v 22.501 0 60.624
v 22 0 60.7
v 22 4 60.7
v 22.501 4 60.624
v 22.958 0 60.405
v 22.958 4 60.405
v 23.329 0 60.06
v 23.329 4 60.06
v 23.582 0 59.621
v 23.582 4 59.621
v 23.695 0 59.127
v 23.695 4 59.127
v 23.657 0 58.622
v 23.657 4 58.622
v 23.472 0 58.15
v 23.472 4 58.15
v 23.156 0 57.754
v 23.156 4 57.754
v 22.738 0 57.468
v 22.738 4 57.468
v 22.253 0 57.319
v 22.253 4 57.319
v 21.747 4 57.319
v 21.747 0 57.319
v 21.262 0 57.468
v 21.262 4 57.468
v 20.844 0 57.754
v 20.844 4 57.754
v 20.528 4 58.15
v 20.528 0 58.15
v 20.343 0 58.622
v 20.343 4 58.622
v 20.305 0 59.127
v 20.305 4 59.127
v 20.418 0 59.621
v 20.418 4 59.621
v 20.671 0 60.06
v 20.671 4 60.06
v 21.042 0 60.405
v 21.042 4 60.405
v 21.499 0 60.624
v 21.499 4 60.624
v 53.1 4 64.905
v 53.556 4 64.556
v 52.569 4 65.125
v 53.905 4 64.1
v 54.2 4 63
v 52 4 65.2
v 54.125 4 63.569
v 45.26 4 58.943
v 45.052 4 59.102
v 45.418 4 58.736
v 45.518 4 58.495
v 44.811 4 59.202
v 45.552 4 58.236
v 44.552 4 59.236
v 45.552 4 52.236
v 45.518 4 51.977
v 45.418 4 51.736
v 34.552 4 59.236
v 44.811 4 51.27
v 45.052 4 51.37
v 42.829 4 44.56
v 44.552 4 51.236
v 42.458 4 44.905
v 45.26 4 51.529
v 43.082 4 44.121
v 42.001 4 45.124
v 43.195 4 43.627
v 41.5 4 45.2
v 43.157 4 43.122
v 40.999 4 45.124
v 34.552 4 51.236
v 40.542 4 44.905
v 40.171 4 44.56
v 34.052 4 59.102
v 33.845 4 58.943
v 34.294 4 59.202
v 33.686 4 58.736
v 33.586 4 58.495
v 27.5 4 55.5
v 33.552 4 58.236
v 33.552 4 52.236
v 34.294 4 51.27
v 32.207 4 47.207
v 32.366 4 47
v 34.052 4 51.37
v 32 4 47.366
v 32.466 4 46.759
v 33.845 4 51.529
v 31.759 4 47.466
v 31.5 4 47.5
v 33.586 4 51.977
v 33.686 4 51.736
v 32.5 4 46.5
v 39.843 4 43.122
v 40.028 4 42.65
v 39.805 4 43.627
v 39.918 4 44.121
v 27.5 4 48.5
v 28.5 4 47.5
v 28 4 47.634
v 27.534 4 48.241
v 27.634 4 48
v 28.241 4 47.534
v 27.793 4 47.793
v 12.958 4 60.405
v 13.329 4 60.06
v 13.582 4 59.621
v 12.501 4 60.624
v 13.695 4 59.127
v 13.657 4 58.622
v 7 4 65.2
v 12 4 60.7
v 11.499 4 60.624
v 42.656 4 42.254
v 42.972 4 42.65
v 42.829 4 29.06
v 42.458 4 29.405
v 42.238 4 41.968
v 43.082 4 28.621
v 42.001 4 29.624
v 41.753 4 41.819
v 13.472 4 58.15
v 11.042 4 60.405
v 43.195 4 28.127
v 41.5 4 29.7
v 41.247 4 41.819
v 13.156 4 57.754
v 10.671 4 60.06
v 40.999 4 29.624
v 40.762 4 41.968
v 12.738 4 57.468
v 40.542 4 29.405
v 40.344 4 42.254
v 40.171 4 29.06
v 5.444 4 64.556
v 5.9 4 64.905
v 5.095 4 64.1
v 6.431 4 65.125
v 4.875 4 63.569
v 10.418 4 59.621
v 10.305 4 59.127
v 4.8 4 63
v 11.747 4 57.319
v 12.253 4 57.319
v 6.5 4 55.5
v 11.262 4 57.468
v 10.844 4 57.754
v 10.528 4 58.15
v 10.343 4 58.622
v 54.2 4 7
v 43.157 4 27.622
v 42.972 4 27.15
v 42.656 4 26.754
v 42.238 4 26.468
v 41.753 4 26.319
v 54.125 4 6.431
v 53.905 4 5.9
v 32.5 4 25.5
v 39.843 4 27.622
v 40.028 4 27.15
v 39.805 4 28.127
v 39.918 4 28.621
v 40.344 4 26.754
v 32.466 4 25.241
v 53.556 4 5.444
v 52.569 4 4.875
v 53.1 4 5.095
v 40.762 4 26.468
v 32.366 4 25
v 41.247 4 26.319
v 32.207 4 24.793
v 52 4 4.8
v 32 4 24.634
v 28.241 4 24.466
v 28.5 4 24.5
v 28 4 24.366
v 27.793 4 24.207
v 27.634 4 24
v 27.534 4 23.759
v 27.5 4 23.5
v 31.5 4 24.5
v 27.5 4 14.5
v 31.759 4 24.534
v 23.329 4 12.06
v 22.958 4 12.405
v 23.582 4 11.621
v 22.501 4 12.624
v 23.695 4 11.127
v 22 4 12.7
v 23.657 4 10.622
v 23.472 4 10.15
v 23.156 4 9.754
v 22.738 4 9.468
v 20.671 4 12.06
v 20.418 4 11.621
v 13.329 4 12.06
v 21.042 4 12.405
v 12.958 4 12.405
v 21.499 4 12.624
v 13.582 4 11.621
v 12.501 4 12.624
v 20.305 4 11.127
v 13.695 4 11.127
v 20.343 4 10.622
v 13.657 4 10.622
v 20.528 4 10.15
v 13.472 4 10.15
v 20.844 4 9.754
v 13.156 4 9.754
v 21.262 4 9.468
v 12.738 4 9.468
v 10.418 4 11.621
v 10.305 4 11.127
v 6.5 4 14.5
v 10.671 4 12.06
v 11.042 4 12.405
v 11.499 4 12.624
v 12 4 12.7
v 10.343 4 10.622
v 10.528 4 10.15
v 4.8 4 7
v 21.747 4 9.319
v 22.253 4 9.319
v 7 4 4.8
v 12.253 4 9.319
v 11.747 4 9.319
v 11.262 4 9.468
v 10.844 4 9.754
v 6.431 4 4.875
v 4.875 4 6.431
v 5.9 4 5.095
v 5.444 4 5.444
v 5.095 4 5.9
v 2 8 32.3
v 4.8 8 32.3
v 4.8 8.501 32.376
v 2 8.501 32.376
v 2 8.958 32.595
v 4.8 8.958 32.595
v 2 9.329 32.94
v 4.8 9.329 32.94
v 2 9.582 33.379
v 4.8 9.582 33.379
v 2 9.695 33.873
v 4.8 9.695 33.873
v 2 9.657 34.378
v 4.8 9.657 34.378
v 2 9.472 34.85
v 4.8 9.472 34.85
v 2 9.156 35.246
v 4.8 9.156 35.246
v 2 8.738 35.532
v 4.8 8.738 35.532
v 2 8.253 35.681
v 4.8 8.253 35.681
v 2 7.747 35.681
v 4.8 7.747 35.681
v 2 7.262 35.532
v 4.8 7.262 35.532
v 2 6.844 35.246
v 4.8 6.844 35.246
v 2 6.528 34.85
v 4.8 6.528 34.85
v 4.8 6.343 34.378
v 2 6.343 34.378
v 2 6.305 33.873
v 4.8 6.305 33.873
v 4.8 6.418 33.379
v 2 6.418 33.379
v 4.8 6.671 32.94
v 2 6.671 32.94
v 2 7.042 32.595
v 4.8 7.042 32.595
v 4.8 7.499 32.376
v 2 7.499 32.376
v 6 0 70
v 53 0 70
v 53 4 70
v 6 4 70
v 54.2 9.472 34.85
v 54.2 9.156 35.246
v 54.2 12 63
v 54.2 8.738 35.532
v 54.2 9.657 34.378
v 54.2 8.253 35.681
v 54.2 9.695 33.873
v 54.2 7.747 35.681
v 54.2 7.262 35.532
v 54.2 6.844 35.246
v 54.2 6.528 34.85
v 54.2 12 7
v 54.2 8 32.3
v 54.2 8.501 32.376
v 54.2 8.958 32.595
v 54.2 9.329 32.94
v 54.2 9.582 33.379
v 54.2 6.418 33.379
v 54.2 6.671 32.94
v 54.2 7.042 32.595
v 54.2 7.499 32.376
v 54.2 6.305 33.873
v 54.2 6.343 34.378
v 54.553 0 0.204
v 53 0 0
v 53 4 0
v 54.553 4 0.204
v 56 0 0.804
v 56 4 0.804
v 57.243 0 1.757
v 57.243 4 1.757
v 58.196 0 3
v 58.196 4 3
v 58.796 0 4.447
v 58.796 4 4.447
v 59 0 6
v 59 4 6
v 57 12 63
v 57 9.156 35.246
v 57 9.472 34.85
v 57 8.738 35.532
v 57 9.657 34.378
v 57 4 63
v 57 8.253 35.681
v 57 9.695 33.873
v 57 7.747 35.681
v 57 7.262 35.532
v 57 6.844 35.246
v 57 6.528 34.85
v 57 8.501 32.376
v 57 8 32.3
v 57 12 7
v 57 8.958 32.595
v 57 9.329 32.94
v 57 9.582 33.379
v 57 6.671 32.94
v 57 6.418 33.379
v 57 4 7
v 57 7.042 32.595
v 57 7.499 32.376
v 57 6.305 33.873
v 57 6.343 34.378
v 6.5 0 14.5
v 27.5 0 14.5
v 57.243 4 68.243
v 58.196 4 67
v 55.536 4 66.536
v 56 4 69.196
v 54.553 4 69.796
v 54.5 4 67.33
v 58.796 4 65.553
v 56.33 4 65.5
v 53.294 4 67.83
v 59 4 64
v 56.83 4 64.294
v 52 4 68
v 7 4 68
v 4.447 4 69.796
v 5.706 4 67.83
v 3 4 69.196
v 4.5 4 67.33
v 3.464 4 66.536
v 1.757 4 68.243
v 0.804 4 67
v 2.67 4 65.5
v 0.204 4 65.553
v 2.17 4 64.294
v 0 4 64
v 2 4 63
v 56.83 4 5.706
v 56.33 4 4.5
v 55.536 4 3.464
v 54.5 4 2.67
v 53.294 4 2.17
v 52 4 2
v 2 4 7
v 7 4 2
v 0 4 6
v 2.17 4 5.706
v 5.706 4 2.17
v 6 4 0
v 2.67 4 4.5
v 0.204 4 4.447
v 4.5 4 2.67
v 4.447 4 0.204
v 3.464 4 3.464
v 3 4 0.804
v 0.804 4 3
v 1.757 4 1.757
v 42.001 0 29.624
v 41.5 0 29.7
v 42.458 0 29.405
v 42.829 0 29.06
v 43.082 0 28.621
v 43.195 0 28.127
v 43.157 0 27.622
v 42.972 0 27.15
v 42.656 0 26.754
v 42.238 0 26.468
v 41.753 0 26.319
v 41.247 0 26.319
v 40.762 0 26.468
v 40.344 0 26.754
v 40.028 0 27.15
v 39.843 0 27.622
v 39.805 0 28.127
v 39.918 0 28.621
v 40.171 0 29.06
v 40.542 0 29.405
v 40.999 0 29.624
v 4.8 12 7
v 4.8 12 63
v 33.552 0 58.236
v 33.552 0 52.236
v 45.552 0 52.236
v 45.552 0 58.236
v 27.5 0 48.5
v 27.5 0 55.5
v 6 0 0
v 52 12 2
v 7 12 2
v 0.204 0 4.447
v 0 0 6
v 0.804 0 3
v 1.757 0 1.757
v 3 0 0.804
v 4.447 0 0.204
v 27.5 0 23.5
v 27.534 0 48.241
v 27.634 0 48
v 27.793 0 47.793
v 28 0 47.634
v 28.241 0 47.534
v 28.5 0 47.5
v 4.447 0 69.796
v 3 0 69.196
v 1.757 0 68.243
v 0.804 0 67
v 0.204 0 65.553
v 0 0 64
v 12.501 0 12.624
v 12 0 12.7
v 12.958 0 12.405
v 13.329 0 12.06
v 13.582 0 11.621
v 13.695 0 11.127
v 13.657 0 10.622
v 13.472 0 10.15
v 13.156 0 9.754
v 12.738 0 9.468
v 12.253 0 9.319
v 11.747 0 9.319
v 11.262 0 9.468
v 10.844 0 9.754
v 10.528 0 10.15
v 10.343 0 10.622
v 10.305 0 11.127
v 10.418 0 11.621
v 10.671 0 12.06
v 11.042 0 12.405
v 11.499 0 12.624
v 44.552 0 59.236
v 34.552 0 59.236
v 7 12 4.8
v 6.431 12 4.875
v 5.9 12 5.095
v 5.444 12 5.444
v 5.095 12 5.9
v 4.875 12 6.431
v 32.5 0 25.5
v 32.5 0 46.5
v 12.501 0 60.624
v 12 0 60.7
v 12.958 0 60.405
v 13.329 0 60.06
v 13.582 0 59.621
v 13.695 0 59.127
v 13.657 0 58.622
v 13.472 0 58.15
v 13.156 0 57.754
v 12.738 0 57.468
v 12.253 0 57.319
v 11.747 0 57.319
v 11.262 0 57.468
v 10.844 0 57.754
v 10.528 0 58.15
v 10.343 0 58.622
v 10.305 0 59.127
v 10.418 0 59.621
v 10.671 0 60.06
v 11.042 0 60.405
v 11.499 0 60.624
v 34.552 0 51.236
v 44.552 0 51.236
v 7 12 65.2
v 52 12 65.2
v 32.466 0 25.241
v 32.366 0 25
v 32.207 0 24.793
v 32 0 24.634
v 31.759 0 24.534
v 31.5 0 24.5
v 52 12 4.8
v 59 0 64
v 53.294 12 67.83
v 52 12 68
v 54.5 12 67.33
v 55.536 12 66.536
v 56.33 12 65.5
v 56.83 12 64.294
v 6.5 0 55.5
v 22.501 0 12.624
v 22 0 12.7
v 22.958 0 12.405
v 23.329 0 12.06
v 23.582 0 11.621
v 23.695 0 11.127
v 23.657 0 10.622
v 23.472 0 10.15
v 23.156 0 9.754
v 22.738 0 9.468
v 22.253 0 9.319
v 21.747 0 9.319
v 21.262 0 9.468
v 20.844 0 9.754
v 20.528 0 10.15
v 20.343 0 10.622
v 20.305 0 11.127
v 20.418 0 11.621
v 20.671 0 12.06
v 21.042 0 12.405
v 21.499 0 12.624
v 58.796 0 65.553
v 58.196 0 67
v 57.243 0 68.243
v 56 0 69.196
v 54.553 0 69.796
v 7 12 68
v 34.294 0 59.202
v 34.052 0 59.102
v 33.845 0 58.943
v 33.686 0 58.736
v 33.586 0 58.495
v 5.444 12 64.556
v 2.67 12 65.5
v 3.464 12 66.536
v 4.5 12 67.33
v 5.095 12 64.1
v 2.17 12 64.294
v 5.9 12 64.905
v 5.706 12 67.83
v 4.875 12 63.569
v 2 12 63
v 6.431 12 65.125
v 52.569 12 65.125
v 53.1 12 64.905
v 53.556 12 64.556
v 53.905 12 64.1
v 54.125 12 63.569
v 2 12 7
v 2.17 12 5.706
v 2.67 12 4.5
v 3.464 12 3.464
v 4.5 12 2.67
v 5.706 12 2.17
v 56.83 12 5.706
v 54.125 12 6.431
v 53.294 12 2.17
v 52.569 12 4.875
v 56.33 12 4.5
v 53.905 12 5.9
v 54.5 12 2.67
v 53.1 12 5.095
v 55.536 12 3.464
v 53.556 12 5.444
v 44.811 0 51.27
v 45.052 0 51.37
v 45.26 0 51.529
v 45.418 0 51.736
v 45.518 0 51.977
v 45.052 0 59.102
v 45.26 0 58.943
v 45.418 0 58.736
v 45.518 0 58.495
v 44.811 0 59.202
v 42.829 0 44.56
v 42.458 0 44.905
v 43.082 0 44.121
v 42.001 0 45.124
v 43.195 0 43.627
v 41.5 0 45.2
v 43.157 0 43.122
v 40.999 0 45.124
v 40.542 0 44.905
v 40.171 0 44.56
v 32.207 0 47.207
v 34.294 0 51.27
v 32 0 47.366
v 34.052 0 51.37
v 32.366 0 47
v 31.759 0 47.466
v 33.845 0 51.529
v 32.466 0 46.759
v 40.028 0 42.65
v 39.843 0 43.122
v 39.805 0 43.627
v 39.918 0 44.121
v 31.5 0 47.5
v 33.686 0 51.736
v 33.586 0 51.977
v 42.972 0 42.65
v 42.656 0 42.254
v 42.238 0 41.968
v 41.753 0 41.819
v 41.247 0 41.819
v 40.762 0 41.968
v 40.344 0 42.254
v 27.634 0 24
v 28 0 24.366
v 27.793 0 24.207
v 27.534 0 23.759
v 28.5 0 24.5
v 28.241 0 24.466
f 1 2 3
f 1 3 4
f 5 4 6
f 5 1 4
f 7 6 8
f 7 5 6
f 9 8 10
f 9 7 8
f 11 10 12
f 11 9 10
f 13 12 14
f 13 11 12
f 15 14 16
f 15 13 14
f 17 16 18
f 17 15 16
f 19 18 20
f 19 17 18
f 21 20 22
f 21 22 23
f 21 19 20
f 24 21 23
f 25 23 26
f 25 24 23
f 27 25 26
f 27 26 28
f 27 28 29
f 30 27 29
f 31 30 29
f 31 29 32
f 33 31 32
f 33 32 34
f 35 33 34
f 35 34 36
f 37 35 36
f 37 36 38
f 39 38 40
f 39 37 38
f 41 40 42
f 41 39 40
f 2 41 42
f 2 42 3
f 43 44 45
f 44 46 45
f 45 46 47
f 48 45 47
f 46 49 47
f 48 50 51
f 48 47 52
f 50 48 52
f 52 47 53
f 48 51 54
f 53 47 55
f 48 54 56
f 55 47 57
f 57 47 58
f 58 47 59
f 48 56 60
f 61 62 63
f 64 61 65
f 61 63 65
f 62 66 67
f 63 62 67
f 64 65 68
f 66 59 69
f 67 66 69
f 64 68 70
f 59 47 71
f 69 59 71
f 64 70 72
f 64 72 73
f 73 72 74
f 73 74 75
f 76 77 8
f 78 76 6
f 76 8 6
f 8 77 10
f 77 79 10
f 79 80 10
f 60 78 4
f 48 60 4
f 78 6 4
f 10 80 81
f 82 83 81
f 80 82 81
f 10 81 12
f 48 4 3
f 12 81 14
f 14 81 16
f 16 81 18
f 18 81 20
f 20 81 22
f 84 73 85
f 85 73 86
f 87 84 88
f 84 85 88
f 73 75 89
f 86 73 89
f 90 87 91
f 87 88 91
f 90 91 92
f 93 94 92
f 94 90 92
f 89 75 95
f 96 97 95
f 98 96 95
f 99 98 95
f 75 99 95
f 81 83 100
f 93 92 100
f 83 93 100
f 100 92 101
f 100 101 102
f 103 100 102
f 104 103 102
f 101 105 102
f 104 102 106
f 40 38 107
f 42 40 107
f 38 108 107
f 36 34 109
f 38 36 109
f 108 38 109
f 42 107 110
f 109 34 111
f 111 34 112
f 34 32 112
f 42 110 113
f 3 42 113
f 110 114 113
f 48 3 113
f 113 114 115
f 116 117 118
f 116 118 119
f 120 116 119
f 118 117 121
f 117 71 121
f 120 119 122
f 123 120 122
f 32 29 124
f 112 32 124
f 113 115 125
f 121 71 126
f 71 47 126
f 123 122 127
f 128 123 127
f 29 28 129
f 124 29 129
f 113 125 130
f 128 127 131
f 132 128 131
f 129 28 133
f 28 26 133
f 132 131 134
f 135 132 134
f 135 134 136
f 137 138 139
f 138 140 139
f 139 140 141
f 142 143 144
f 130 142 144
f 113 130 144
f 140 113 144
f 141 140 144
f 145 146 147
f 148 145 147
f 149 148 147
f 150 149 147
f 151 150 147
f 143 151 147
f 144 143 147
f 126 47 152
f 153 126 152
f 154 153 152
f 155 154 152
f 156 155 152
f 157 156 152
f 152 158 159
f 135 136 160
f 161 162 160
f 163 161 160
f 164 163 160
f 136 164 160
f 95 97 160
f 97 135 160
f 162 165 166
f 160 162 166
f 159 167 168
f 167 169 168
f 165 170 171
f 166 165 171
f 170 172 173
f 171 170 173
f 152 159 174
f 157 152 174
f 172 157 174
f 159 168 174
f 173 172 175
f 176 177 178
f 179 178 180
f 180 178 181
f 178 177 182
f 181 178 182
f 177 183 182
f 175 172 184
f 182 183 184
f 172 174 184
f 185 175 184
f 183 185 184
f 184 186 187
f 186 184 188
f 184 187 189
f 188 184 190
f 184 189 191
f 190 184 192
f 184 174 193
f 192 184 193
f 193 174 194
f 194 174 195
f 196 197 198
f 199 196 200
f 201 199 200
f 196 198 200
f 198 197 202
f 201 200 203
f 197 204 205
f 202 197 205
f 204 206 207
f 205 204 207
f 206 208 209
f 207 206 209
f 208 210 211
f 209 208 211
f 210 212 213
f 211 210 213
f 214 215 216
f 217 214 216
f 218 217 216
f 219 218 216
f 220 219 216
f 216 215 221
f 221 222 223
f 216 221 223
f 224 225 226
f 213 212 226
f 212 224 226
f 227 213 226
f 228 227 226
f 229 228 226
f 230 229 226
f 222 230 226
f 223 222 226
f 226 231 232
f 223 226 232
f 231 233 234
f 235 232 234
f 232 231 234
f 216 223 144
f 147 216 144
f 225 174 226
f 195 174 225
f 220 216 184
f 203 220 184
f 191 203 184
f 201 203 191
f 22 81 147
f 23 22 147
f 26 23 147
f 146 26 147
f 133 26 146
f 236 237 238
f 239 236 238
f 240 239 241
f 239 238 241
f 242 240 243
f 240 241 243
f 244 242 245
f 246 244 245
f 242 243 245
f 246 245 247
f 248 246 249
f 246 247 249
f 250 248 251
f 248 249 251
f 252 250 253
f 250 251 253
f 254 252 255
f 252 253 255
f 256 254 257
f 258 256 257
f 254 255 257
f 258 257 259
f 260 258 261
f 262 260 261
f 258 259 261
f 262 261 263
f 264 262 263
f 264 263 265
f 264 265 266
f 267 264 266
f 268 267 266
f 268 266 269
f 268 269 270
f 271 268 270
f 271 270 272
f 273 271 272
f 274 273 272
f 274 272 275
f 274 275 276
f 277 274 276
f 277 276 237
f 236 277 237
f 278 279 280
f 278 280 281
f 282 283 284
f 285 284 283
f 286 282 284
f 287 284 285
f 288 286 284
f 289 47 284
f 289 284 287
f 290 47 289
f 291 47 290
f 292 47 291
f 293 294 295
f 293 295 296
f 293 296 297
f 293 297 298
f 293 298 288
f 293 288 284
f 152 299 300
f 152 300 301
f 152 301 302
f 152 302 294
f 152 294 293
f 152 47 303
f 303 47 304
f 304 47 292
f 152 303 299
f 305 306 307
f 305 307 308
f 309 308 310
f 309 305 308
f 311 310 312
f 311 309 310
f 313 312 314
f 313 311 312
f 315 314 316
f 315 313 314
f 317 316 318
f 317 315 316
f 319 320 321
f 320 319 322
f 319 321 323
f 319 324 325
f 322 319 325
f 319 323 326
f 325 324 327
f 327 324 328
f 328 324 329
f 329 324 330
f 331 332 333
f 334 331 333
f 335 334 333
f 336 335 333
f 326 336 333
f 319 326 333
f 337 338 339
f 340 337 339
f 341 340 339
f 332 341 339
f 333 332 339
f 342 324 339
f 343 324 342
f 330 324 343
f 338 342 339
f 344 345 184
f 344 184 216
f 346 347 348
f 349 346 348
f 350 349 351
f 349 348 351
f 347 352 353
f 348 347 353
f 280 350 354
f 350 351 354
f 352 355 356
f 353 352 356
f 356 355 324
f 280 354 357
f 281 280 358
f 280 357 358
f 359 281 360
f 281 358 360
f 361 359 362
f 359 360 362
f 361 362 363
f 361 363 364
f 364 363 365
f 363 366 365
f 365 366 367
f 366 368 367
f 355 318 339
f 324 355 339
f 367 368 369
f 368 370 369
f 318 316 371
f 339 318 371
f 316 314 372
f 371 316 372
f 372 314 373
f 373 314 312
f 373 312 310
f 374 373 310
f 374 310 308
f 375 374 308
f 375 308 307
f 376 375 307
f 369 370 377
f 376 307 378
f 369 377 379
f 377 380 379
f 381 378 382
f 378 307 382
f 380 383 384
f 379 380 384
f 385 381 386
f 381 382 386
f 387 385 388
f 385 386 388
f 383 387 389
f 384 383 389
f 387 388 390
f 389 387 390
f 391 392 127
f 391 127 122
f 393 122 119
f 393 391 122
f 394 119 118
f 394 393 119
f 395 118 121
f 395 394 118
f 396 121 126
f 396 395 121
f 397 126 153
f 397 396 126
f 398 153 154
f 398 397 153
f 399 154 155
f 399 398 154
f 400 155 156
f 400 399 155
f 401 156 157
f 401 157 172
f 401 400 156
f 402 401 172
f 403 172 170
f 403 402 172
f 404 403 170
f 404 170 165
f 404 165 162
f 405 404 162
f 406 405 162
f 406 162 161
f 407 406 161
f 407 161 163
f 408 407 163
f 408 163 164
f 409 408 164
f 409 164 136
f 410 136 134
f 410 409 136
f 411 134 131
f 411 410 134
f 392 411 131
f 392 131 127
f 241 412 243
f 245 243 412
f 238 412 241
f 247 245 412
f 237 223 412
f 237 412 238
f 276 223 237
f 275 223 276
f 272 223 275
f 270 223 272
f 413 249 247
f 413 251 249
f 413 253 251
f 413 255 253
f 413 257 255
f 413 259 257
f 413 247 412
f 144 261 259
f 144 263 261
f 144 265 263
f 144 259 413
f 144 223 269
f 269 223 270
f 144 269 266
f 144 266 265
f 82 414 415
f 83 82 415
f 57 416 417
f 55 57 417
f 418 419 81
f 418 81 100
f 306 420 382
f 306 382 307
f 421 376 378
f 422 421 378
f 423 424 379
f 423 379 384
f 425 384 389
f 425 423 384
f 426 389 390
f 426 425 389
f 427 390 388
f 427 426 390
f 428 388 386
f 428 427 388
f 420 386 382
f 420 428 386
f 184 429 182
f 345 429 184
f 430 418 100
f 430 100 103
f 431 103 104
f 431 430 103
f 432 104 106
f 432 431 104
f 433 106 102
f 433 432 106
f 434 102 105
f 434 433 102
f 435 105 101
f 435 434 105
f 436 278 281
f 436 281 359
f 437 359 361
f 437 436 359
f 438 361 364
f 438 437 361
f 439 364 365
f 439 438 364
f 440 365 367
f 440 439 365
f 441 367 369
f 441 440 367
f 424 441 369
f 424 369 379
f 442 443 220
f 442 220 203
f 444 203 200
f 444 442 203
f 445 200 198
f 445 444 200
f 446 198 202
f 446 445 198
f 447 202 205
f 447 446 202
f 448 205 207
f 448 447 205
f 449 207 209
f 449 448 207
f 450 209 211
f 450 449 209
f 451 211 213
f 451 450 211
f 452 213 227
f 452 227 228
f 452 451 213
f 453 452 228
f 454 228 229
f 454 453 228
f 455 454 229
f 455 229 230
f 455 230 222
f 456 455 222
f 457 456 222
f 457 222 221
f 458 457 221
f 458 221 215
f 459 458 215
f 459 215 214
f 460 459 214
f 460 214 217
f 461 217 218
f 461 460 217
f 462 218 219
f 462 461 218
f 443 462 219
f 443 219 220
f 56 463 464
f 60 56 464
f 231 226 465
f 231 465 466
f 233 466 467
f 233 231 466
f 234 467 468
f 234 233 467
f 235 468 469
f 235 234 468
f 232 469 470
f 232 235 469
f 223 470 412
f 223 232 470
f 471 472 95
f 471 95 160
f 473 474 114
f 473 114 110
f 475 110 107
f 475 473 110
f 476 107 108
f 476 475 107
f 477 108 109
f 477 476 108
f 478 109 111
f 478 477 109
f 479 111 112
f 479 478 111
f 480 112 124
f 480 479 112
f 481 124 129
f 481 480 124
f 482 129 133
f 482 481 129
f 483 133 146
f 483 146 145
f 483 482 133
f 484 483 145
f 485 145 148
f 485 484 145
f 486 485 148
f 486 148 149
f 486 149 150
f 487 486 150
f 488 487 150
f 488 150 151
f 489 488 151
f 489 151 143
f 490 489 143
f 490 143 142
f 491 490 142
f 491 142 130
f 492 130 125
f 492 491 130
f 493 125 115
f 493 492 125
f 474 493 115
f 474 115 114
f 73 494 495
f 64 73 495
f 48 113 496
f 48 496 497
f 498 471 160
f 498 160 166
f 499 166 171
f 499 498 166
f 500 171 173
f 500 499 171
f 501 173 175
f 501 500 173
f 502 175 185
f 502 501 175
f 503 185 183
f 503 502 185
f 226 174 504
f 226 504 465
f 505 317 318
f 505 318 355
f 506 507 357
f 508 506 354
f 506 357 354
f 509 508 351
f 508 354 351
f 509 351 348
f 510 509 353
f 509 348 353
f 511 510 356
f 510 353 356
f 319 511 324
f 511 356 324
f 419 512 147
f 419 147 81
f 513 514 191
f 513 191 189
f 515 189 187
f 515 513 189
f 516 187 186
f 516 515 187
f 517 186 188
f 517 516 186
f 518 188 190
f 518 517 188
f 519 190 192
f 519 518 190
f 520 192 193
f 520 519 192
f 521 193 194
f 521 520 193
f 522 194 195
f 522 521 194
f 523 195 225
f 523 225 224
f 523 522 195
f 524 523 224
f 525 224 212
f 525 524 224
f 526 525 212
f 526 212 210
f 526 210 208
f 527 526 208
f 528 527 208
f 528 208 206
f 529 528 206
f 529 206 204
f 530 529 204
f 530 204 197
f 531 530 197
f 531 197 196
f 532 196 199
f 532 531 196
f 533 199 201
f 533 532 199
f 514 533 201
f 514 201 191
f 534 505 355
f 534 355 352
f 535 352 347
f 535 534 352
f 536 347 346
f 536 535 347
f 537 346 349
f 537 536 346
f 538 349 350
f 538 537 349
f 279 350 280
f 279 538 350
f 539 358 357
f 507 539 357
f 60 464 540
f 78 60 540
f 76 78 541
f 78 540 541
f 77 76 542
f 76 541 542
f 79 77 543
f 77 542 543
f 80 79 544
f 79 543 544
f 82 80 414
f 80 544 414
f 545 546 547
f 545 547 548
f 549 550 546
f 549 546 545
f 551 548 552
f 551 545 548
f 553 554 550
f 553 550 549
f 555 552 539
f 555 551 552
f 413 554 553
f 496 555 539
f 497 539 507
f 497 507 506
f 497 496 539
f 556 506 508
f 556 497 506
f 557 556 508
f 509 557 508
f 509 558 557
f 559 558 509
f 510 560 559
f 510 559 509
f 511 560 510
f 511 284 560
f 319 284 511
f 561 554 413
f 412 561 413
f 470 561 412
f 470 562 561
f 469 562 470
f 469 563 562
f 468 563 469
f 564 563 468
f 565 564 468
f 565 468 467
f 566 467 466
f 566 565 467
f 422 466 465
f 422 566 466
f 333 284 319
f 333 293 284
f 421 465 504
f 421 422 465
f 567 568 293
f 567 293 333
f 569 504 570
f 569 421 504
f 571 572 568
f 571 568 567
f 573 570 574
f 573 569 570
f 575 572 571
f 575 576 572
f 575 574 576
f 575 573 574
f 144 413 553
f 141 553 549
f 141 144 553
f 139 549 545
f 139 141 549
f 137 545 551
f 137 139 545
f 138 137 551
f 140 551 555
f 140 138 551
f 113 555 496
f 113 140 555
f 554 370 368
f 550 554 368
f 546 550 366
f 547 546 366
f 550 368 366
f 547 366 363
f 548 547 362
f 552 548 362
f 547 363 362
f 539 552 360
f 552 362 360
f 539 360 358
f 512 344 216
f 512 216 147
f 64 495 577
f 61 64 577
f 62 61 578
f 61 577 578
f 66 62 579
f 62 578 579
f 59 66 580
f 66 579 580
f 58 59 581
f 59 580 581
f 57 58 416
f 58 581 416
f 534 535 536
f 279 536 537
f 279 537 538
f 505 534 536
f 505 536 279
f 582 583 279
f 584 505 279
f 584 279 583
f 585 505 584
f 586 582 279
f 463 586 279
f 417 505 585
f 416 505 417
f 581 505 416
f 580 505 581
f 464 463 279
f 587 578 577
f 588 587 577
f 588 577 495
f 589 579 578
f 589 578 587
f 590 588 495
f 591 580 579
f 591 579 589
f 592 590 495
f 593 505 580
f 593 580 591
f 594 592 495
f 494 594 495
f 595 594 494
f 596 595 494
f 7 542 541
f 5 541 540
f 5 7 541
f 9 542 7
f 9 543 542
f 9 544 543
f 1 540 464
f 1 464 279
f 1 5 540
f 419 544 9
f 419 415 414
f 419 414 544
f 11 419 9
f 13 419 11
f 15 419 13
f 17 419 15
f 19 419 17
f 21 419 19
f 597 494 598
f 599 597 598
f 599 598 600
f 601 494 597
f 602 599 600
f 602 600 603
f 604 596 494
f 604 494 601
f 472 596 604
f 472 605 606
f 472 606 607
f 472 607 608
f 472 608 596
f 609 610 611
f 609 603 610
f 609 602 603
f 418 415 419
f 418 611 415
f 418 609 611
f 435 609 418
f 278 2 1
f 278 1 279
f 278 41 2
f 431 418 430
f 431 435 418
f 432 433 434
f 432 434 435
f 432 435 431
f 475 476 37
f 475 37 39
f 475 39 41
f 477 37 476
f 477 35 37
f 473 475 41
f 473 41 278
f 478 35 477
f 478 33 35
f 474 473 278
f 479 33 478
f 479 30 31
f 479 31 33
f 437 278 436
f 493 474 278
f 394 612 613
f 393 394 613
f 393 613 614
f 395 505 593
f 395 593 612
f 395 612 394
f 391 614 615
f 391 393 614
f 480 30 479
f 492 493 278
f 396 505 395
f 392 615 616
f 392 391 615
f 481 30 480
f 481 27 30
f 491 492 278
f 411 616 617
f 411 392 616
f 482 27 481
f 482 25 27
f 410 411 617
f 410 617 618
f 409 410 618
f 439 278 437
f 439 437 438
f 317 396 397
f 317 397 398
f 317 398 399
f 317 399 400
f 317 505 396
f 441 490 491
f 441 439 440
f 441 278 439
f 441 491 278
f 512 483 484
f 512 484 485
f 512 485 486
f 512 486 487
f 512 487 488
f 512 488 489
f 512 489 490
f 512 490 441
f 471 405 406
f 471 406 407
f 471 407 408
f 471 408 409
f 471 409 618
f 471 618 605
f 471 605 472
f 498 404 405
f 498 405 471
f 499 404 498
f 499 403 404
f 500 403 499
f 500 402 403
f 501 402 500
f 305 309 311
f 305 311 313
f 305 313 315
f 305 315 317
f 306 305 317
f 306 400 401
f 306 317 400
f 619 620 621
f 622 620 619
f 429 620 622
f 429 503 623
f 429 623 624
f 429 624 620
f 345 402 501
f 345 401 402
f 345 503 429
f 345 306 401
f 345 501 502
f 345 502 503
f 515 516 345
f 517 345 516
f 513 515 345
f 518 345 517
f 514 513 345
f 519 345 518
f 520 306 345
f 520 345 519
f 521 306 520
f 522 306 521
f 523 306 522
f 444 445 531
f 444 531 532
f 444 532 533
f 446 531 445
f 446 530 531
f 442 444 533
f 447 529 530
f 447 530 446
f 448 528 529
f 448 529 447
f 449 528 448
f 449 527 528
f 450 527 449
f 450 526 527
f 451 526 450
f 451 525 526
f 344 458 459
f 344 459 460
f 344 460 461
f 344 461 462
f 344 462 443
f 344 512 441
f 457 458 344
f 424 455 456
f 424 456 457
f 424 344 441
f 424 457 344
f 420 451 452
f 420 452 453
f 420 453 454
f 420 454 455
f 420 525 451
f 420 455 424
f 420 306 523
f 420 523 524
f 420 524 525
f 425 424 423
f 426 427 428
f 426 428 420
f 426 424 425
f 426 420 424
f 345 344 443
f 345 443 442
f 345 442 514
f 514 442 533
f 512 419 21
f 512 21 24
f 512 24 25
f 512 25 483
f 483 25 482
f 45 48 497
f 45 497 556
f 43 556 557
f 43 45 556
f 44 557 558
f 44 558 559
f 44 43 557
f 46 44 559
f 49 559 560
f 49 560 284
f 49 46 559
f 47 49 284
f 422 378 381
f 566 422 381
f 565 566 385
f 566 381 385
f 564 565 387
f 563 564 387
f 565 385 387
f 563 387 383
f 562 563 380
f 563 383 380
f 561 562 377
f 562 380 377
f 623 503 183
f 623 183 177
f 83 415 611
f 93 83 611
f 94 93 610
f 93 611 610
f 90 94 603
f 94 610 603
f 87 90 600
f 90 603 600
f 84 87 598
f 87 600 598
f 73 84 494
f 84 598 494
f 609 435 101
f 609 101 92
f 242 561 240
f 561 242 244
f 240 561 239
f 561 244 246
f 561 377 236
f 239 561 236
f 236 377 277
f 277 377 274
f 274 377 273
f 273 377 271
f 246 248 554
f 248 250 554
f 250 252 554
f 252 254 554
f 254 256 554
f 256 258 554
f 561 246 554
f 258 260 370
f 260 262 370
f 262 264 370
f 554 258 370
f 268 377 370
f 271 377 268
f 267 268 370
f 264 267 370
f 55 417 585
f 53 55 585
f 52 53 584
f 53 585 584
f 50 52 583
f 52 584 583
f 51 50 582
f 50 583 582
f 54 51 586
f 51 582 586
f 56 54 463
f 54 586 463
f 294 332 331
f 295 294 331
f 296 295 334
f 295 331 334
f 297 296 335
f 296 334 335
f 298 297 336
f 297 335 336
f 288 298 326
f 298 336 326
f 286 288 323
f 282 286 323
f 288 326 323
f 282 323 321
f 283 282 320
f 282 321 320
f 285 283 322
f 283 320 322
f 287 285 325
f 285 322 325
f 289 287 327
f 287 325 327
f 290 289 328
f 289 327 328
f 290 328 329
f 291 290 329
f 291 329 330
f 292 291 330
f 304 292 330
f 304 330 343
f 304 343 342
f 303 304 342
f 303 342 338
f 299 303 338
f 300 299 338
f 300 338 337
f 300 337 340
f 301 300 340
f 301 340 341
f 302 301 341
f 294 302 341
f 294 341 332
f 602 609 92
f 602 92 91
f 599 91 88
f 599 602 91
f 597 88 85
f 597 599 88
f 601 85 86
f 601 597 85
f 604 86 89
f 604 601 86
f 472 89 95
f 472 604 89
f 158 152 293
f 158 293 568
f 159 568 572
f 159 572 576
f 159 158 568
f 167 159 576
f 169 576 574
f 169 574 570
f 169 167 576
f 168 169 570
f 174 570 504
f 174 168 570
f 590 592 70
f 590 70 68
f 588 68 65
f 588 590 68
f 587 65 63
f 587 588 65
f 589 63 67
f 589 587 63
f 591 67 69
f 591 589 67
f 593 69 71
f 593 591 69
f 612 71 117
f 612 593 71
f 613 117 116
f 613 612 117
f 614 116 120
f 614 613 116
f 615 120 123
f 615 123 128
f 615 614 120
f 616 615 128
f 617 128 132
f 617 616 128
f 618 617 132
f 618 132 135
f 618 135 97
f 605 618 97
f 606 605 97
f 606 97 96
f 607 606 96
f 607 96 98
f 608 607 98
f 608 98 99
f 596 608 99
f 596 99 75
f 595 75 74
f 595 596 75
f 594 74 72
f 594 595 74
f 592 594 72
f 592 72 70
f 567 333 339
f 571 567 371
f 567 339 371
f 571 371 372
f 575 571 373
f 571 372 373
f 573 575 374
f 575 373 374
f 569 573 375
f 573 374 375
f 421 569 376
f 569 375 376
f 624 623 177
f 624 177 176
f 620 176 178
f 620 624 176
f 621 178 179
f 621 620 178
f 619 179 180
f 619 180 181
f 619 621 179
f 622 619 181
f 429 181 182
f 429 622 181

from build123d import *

# Parameters (mm, degrees)
SKETCH2_R           = 1.699999062
SKETCH2_R_2         = 1.69999994
BOSS_EXTRUDE1_DEPTH = 4
BOSS_EXTRUDE2_DEPTH = 8
SKETCH4_R           = 1.7
CUT_EXTRUDE1_DEPTH  = 93


# Read off the part's stored shape, not the designer's step: Surface-Imported1
with BuildPart() as part:
    # Sketch2 → Boss-Extrude1 (new body)
    with BuildSketch(Plane(origin=(0, 0, 0), x_dir=(1, 0, 0), z_dir=(0, 1, 0))):
        with BuildLine():
            Line((6.000000983, 0), (52.999999374, 0))
            ThreePointArc((52.999999374, 0), (57.242640757, -1.757359601), (59.000000358, -6.000000983))
            Line((59.000000358, -6.000000983), (59.000000358, -63.999995589))
            ThreePointArc((59.000000358, -63.999995589), (57.242641528, -68.242638834), (52.999999374, -70.000000298))
            Line((52.999999374, -70.000000298), (6.000000983, -70.000000298))
            ThreePointArc((6.000000983, -70.000000298), (1.75735699, -68.242640674), (0, -63.999995589))
            Line((0, -63.999995589), (0, -6.000000983))
            ThreePointArc((0, -6.000000983), (1.757359601, -1.757359601), (6.000000983, 0))
        make_face()
        with Locations(Location((12.000001036, -10.99999994, 0), (0, 0, 270))):
            Circle(SKETCH2_R, mode=Mode.SUBTRACT)
        with Locations(Location((22.000001036, -10.99999994, 0), (0, 0, 270))):
            Circle(SKETCH2_R, mode=Mode.SUBTRACT)
        with Locations(Location((22.000001036, -59.000000715, 0), (0, 0, 270))):
            Circle(SKETCH2_R, mode=Mode.SUBTRACT)
        with Locations(Location((12.000001036, -59.000000715, 0), (0, 0, 270))):
            Circle(SKETCH2_R, mode=Mode.SUBTRACT)
        with Locations(Location((41.50000118, -27.999999899, 0), (0, 0, 270))):
            Circle(SKETCH2_R_2, mode=Mode.SUBTRACT)
        with Locations(Location((41.50000118, -43.499999899, 0), (0, 0, 270))):
            Circle(SKETCH2_R_2, mode=Mode.SUBTRACT)
        with BuildLine():
            Line((32.499998808, -46.500001103), (32.499998808, -25.499999523))
            ThreePointArc((32.499998808, -25.499999523), (32.207106087, -24.792893943), (31.500000507, -24.500001222))
            Line((31.500000507, -24.500001222), (28.500001878, -24.500001222))
            ThreePointArc((28.500001878, -24.500001222), (27.792893663, -24.20710741), (27.499999851, -23.499999195))
            Line((27.499999851, -23.499999195), (27.499999851, -14.499999583))
            Line((27.499999851, -14.499999583), (6.500001065, -14.499999583))
            Line((6.500001065, -14.499999583), (6.500001065, -55.500000715))
            Line((6.500001065, -55.500000715), (27.499999851, -55.500000715))
            Line((27.499999851, -55.500000715), (27.499999851, -48.500001431))
            ThreePointArc((27.499999851, -48.500001431), (27.792894046, -47.792893599), (28.500001878, -47.499999404))
            Line((28.500001878, -47.499999404), (31.500000507, -47.499999404))
            ThreePointArc((31.500000507, -47.499999404), (32.207106087, -47.207106683), (32.499998808, -46.500001103))
        make_face(mode=Mode.SUBTRACT)
        with BuildLine():
            Line((34.55240652, -51.235973835), (44.55240652, -51.235973835))
            ThreePointArc((44.55240652, -51.235973835), (45.259513765, -51.528867517), (45.55240652, -52.235975146))
            Line((45.55240652, -52.235975146), (45.55240652, -58.235975146))
            ThreePointArc((45.55240652, -58.235975146), (45.259513301, -58.943081927), (44.55240652, -59.235975146))
            Line((44.55240652, -59.235975146), (34.55240652, -59.235975146))
            ThreePointArc((34.55240652, -59.235975146), (33.845298305, -58.943081334), (33.552404493, -58.23597312))
            Line((33.552404493, -58.23597312), (33.552404493, -52.235975862))
            ThreePointArc((33.552404493, -52.235975862), (33.845297712, -51.528867054), (34.55240652, -51.235973835))
        make_face(mode=Mode.SUBTRACT)
    extrude(amount=BOSS_EXTRUDE1_DEPTH)

    # Sketch3 → Boss-Extrude2 (add)
    with BuildSketch(Plane(origin=(0, 4, 0), x_dir=(1, 0, 0), z_dir=(0, 1, 0))):
        with BuildLine():
            Line((2, -7), (2, -63.000000298))
            ThreePointArc((2, -63.000000298), (3.464466094, -66.535534204), (7, -68.000000298))
            Line((7, -68.000000298), (52.000000358, -68.000000298))
            ThreePointArc((52.000000358, -68.000000298), (55.535534264, -66.535534204), (57.000000358, -63.000000298))
            Line((57.000000358, -63.000000298), (57.000000358, -7))
            ThreePointArc((57.000000358, -7), (55.535534264, -3.464466094), (52.000000358, -2))
            Line((52.000000358, -2), (7, -2))
            ThreePointArc((7, -2), (3.464466094, -3.464466094), (2, -7))
        make_face()
        with BuildLine():
            Line((4.8, -7), (4.8, -63.000000298))
            ThreePointArc((4.8, -63.000000298), (5.444365081, -64.555635217), (7, -65.200000298))
            Line((7, -65.200000298), (52.000000358, -65.200000298))
            ThreePointArc((52.000000358, -65.200000298), (53.555635276, -64.555635217), (54.200000358, -63.000000298))
            Line((54.200000358, -63.000000298), (54.200000358, -7))
            ThreePointArc((54.200000358, -7), (53.555635276, -5.444365081), (52.000000358, -4.8))
            Line((52.000000358, -4.8), (7, -4.8))
            ThreePointArc((7, -4.8), (5.444365081, -5.444365081), (4.8, -7))
        make_face(mode=Mode.SUBTRACT)
    extrude(amount=BOSS_EXTRUDE2_DEPTH)

    # Sketch4 → Cut-Extrude1 (cut)
    with BuildSketch(Plane(origin=(57.000000358, 0, 0), x_dir=(0, 0, -1), z_dir=(1, 0, 0))):
        with Locations((-34.000000298, 8)):
            Circle(SKETCH4_R)
    extrude(amount=-CUT_EXTRUDE1_DEPTH, mode=Mode.SUBTRACT)


solid = part.part
